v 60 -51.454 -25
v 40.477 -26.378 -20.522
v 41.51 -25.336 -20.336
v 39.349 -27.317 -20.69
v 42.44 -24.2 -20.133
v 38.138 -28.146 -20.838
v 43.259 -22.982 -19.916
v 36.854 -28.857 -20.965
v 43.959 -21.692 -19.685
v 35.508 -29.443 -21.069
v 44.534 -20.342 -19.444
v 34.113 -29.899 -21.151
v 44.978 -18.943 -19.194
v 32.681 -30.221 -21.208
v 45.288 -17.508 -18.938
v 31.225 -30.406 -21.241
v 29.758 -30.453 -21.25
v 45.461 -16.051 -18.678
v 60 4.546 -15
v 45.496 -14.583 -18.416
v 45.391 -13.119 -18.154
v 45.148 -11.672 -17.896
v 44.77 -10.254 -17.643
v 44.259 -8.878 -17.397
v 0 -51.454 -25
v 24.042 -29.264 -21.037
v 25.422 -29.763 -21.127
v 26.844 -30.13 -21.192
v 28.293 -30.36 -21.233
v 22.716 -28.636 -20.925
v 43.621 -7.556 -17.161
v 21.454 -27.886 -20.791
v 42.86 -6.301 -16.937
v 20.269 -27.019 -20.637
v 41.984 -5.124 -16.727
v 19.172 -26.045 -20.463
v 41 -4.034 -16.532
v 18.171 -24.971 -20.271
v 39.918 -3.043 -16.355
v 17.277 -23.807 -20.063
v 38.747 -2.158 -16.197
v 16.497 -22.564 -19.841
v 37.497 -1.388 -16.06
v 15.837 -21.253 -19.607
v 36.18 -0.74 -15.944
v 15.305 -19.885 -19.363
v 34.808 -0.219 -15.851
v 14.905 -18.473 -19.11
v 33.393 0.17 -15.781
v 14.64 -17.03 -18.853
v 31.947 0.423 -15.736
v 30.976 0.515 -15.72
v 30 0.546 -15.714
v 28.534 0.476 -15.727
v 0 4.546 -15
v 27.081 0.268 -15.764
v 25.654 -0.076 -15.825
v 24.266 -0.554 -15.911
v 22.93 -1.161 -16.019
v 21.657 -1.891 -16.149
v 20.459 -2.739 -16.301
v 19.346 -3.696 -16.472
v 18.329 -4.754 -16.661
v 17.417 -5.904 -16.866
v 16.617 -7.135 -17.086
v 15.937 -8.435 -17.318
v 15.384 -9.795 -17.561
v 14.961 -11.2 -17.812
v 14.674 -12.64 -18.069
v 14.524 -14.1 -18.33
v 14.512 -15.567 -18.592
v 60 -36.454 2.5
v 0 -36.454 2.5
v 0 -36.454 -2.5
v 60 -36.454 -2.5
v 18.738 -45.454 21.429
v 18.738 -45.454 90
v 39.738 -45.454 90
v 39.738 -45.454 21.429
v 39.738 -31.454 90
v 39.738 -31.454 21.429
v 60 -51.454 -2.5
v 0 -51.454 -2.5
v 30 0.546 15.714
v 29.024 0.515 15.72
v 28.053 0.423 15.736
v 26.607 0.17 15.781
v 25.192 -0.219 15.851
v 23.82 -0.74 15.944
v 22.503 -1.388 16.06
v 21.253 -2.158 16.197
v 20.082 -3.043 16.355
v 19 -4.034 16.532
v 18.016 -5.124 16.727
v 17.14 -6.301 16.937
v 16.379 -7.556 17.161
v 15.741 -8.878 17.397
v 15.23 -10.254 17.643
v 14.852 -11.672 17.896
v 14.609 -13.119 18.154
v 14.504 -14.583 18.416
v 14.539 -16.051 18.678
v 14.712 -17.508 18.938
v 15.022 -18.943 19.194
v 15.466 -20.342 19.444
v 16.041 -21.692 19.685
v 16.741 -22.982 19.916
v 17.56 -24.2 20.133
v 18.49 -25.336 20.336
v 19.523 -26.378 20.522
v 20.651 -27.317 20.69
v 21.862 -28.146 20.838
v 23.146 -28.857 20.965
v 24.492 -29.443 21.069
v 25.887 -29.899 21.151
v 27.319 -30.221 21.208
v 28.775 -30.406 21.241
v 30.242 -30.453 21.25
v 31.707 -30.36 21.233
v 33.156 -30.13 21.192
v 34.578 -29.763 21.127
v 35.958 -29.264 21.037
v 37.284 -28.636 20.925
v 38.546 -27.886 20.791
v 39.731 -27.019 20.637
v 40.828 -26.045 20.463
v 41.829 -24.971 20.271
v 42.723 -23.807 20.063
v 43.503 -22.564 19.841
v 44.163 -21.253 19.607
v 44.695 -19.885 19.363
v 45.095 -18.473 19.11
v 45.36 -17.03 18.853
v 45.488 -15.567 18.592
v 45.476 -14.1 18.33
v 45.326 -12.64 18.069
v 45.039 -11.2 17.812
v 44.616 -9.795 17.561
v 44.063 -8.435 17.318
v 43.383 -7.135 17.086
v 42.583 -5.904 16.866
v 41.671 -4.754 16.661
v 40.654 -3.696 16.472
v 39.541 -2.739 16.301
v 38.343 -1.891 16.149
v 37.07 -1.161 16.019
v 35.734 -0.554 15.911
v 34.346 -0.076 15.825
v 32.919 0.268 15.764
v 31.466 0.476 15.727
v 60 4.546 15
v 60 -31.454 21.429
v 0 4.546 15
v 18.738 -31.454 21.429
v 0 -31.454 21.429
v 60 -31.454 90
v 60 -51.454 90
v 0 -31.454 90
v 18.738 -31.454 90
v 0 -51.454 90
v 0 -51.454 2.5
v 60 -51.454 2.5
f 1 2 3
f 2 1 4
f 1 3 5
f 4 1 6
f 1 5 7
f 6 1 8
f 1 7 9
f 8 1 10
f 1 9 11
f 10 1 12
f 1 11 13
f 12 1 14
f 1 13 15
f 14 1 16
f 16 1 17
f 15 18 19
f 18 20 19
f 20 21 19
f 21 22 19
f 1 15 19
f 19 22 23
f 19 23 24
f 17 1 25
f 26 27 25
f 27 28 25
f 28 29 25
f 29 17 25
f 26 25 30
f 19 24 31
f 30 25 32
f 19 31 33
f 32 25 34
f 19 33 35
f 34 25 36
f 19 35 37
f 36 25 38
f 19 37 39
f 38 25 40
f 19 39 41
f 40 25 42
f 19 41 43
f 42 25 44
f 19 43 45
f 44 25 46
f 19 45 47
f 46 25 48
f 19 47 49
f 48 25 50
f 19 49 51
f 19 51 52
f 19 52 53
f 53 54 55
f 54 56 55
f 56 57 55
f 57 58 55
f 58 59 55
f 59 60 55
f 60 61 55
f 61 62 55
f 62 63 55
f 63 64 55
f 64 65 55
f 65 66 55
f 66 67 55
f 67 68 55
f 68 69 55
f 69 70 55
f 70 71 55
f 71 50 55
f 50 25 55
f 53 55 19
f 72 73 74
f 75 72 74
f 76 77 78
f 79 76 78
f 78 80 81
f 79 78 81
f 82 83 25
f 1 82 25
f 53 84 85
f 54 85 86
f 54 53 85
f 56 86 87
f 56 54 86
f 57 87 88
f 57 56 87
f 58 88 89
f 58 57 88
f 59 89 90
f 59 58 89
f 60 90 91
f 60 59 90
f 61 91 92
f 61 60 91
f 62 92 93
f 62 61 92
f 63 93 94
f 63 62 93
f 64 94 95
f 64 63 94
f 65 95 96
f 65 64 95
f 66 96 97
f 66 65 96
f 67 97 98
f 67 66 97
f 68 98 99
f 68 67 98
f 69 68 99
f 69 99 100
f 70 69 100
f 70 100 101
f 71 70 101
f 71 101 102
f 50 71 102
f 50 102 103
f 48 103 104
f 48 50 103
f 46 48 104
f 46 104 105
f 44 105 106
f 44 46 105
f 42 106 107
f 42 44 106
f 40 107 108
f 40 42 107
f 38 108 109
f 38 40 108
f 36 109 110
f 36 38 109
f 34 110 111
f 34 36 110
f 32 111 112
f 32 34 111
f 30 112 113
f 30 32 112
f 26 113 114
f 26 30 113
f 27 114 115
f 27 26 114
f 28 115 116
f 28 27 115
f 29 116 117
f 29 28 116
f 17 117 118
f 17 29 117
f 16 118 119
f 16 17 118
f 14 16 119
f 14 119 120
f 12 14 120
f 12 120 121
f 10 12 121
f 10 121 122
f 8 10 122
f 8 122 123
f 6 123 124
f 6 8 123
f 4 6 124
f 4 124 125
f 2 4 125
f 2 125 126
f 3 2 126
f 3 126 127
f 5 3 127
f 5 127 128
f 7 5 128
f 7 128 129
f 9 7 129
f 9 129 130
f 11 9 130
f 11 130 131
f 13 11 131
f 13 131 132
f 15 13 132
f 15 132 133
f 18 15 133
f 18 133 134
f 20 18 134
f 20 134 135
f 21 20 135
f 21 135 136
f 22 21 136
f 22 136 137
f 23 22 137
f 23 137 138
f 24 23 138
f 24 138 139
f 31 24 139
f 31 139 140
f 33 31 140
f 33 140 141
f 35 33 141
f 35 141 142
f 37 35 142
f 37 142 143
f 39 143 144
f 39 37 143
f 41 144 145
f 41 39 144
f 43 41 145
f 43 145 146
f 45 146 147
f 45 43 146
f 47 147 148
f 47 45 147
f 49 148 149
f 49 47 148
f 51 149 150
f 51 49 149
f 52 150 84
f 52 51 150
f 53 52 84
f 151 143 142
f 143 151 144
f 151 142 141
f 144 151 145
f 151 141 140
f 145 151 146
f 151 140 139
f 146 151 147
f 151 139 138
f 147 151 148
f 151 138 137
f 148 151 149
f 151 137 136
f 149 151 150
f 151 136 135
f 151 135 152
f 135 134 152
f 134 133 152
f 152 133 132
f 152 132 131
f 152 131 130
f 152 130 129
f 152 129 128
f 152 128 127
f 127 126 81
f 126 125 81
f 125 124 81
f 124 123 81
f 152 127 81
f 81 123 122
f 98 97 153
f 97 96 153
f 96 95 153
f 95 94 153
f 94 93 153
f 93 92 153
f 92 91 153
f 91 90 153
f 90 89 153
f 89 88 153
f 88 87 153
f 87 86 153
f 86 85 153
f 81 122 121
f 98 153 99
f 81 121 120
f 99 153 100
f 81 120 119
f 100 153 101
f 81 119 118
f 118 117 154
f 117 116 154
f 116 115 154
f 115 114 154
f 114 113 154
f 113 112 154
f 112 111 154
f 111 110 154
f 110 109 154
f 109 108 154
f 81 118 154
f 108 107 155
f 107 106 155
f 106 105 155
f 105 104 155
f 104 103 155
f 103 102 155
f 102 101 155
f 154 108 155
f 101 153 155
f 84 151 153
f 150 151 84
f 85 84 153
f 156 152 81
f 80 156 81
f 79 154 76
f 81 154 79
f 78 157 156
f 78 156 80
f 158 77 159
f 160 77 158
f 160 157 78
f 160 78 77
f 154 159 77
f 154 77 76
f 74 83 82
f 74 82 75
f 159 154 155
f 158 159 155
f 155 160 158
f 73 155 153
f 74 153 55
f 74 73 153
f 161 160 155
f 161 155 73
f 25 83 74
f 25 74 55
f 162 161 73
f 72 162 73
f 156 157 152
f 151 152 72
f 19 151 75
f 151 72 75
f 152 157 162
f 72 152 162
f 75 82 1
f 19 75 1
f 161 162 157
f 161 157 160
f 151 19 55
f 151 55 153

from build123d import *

# Parameters (mm, degrees)
EXTRUDE_1_DEPTH          = 60
CUT_EXTRUDE_1_DEPTH      = 40
CUT_EXTRUDE_1_DEPTH_BACK = 29
SKETCH_4_R               = 15.5
SKETCH_5_W               = 5
SKETCH_5_H               = 30
CUT_EXTRUDE_2_DEPTH      = 83.900874001
SKETCH_7_W               = 60
SKETCH_7_H               = 85.424918669
EXTRUDE_2_DEPTH          = 20
CUT_EXTRUDE_START        = -31.454396
SKETCH_8_W               = 21
SKETCH_8_H               = 68.571428571
CUT_EXTRUDE_3_DEPTH      = 14


with BuildPart() as part:
    # 스케치3 → 보스-돌출1 (new body)
    with BuildSketch(Plane(origin=(0, 0, 0), x_dir=(0, 0, -1), z_dir=(1, 0, 0))):
        Polygon((-25, -51.454396413), (25, -51.454396413), (15, 4.545603587), (-15, 4.545603587), align=None)
    extrude(amount=EXTRUDE_1_DEPTH)

    # 스케치4 → 컷-돌출1 (cut, two sides: drawn at the far end of the back side and taken through both)
    with BuildSketch(Plane.XY.offset(-CUT_EXTRUDE_1_DEPTH_BACK)):
        with Locations(Location((30, -14.954396413, 0), (0, 0, 90))):
            Circle(SKETCH_4_R)
    extrude(amount=CUT_EXTRUDE_1_DEPTH + CUT_EXTRUDE_1_DEPTH_BACK, mode=Mode.SUBTRACT)

    # 스케치5 → 컷-돌출2 (cut, through all)
    with BuildSketch(Plane(origin=(0, 0, 0), x_dir=(0, 0, -1), z_dir=(1, 0, 0))):
        with Locations((0, -51.454396413)):
            Rectangle(SKETCH_5_W, SKETCH_5_H)
    extrude(amount=CUT_EXTRUDE_2_DEPTH, mode=Mode.SUBTRACT)

    # 스케치7 → 보스-돌출2 (add)
    with BuildSketch(Plane(origin=(0, -51.454396413, 0), x_dir=(-1, 0, 0), z_dir=(0, -1, 0))):
        with Locations((-30, -47.287540666)):
            Rectangle(SKETCH_7_W, SKETCH_7_H)
    extrude(amount=-EXTRUDE_2_DEPTH)

    # 스케치8 → 컷-돌출3 (cut)
    with BuildSketch(Plane(origin=(0, 0, 0), x_dir=(1, 0, 0), z_dir=(0, 1, 0)).offset(CUT_EXTRUDE_START)):
        with Locations((29.238428934, -55.714285715)):
            Rectangle(SKETCH_8_W, SKETCH_8_H)
    extrude(amount=-CUT_EXTRUDE_3_DEPTH, mode=Mode.SUBTRACT)


solid = part.part
